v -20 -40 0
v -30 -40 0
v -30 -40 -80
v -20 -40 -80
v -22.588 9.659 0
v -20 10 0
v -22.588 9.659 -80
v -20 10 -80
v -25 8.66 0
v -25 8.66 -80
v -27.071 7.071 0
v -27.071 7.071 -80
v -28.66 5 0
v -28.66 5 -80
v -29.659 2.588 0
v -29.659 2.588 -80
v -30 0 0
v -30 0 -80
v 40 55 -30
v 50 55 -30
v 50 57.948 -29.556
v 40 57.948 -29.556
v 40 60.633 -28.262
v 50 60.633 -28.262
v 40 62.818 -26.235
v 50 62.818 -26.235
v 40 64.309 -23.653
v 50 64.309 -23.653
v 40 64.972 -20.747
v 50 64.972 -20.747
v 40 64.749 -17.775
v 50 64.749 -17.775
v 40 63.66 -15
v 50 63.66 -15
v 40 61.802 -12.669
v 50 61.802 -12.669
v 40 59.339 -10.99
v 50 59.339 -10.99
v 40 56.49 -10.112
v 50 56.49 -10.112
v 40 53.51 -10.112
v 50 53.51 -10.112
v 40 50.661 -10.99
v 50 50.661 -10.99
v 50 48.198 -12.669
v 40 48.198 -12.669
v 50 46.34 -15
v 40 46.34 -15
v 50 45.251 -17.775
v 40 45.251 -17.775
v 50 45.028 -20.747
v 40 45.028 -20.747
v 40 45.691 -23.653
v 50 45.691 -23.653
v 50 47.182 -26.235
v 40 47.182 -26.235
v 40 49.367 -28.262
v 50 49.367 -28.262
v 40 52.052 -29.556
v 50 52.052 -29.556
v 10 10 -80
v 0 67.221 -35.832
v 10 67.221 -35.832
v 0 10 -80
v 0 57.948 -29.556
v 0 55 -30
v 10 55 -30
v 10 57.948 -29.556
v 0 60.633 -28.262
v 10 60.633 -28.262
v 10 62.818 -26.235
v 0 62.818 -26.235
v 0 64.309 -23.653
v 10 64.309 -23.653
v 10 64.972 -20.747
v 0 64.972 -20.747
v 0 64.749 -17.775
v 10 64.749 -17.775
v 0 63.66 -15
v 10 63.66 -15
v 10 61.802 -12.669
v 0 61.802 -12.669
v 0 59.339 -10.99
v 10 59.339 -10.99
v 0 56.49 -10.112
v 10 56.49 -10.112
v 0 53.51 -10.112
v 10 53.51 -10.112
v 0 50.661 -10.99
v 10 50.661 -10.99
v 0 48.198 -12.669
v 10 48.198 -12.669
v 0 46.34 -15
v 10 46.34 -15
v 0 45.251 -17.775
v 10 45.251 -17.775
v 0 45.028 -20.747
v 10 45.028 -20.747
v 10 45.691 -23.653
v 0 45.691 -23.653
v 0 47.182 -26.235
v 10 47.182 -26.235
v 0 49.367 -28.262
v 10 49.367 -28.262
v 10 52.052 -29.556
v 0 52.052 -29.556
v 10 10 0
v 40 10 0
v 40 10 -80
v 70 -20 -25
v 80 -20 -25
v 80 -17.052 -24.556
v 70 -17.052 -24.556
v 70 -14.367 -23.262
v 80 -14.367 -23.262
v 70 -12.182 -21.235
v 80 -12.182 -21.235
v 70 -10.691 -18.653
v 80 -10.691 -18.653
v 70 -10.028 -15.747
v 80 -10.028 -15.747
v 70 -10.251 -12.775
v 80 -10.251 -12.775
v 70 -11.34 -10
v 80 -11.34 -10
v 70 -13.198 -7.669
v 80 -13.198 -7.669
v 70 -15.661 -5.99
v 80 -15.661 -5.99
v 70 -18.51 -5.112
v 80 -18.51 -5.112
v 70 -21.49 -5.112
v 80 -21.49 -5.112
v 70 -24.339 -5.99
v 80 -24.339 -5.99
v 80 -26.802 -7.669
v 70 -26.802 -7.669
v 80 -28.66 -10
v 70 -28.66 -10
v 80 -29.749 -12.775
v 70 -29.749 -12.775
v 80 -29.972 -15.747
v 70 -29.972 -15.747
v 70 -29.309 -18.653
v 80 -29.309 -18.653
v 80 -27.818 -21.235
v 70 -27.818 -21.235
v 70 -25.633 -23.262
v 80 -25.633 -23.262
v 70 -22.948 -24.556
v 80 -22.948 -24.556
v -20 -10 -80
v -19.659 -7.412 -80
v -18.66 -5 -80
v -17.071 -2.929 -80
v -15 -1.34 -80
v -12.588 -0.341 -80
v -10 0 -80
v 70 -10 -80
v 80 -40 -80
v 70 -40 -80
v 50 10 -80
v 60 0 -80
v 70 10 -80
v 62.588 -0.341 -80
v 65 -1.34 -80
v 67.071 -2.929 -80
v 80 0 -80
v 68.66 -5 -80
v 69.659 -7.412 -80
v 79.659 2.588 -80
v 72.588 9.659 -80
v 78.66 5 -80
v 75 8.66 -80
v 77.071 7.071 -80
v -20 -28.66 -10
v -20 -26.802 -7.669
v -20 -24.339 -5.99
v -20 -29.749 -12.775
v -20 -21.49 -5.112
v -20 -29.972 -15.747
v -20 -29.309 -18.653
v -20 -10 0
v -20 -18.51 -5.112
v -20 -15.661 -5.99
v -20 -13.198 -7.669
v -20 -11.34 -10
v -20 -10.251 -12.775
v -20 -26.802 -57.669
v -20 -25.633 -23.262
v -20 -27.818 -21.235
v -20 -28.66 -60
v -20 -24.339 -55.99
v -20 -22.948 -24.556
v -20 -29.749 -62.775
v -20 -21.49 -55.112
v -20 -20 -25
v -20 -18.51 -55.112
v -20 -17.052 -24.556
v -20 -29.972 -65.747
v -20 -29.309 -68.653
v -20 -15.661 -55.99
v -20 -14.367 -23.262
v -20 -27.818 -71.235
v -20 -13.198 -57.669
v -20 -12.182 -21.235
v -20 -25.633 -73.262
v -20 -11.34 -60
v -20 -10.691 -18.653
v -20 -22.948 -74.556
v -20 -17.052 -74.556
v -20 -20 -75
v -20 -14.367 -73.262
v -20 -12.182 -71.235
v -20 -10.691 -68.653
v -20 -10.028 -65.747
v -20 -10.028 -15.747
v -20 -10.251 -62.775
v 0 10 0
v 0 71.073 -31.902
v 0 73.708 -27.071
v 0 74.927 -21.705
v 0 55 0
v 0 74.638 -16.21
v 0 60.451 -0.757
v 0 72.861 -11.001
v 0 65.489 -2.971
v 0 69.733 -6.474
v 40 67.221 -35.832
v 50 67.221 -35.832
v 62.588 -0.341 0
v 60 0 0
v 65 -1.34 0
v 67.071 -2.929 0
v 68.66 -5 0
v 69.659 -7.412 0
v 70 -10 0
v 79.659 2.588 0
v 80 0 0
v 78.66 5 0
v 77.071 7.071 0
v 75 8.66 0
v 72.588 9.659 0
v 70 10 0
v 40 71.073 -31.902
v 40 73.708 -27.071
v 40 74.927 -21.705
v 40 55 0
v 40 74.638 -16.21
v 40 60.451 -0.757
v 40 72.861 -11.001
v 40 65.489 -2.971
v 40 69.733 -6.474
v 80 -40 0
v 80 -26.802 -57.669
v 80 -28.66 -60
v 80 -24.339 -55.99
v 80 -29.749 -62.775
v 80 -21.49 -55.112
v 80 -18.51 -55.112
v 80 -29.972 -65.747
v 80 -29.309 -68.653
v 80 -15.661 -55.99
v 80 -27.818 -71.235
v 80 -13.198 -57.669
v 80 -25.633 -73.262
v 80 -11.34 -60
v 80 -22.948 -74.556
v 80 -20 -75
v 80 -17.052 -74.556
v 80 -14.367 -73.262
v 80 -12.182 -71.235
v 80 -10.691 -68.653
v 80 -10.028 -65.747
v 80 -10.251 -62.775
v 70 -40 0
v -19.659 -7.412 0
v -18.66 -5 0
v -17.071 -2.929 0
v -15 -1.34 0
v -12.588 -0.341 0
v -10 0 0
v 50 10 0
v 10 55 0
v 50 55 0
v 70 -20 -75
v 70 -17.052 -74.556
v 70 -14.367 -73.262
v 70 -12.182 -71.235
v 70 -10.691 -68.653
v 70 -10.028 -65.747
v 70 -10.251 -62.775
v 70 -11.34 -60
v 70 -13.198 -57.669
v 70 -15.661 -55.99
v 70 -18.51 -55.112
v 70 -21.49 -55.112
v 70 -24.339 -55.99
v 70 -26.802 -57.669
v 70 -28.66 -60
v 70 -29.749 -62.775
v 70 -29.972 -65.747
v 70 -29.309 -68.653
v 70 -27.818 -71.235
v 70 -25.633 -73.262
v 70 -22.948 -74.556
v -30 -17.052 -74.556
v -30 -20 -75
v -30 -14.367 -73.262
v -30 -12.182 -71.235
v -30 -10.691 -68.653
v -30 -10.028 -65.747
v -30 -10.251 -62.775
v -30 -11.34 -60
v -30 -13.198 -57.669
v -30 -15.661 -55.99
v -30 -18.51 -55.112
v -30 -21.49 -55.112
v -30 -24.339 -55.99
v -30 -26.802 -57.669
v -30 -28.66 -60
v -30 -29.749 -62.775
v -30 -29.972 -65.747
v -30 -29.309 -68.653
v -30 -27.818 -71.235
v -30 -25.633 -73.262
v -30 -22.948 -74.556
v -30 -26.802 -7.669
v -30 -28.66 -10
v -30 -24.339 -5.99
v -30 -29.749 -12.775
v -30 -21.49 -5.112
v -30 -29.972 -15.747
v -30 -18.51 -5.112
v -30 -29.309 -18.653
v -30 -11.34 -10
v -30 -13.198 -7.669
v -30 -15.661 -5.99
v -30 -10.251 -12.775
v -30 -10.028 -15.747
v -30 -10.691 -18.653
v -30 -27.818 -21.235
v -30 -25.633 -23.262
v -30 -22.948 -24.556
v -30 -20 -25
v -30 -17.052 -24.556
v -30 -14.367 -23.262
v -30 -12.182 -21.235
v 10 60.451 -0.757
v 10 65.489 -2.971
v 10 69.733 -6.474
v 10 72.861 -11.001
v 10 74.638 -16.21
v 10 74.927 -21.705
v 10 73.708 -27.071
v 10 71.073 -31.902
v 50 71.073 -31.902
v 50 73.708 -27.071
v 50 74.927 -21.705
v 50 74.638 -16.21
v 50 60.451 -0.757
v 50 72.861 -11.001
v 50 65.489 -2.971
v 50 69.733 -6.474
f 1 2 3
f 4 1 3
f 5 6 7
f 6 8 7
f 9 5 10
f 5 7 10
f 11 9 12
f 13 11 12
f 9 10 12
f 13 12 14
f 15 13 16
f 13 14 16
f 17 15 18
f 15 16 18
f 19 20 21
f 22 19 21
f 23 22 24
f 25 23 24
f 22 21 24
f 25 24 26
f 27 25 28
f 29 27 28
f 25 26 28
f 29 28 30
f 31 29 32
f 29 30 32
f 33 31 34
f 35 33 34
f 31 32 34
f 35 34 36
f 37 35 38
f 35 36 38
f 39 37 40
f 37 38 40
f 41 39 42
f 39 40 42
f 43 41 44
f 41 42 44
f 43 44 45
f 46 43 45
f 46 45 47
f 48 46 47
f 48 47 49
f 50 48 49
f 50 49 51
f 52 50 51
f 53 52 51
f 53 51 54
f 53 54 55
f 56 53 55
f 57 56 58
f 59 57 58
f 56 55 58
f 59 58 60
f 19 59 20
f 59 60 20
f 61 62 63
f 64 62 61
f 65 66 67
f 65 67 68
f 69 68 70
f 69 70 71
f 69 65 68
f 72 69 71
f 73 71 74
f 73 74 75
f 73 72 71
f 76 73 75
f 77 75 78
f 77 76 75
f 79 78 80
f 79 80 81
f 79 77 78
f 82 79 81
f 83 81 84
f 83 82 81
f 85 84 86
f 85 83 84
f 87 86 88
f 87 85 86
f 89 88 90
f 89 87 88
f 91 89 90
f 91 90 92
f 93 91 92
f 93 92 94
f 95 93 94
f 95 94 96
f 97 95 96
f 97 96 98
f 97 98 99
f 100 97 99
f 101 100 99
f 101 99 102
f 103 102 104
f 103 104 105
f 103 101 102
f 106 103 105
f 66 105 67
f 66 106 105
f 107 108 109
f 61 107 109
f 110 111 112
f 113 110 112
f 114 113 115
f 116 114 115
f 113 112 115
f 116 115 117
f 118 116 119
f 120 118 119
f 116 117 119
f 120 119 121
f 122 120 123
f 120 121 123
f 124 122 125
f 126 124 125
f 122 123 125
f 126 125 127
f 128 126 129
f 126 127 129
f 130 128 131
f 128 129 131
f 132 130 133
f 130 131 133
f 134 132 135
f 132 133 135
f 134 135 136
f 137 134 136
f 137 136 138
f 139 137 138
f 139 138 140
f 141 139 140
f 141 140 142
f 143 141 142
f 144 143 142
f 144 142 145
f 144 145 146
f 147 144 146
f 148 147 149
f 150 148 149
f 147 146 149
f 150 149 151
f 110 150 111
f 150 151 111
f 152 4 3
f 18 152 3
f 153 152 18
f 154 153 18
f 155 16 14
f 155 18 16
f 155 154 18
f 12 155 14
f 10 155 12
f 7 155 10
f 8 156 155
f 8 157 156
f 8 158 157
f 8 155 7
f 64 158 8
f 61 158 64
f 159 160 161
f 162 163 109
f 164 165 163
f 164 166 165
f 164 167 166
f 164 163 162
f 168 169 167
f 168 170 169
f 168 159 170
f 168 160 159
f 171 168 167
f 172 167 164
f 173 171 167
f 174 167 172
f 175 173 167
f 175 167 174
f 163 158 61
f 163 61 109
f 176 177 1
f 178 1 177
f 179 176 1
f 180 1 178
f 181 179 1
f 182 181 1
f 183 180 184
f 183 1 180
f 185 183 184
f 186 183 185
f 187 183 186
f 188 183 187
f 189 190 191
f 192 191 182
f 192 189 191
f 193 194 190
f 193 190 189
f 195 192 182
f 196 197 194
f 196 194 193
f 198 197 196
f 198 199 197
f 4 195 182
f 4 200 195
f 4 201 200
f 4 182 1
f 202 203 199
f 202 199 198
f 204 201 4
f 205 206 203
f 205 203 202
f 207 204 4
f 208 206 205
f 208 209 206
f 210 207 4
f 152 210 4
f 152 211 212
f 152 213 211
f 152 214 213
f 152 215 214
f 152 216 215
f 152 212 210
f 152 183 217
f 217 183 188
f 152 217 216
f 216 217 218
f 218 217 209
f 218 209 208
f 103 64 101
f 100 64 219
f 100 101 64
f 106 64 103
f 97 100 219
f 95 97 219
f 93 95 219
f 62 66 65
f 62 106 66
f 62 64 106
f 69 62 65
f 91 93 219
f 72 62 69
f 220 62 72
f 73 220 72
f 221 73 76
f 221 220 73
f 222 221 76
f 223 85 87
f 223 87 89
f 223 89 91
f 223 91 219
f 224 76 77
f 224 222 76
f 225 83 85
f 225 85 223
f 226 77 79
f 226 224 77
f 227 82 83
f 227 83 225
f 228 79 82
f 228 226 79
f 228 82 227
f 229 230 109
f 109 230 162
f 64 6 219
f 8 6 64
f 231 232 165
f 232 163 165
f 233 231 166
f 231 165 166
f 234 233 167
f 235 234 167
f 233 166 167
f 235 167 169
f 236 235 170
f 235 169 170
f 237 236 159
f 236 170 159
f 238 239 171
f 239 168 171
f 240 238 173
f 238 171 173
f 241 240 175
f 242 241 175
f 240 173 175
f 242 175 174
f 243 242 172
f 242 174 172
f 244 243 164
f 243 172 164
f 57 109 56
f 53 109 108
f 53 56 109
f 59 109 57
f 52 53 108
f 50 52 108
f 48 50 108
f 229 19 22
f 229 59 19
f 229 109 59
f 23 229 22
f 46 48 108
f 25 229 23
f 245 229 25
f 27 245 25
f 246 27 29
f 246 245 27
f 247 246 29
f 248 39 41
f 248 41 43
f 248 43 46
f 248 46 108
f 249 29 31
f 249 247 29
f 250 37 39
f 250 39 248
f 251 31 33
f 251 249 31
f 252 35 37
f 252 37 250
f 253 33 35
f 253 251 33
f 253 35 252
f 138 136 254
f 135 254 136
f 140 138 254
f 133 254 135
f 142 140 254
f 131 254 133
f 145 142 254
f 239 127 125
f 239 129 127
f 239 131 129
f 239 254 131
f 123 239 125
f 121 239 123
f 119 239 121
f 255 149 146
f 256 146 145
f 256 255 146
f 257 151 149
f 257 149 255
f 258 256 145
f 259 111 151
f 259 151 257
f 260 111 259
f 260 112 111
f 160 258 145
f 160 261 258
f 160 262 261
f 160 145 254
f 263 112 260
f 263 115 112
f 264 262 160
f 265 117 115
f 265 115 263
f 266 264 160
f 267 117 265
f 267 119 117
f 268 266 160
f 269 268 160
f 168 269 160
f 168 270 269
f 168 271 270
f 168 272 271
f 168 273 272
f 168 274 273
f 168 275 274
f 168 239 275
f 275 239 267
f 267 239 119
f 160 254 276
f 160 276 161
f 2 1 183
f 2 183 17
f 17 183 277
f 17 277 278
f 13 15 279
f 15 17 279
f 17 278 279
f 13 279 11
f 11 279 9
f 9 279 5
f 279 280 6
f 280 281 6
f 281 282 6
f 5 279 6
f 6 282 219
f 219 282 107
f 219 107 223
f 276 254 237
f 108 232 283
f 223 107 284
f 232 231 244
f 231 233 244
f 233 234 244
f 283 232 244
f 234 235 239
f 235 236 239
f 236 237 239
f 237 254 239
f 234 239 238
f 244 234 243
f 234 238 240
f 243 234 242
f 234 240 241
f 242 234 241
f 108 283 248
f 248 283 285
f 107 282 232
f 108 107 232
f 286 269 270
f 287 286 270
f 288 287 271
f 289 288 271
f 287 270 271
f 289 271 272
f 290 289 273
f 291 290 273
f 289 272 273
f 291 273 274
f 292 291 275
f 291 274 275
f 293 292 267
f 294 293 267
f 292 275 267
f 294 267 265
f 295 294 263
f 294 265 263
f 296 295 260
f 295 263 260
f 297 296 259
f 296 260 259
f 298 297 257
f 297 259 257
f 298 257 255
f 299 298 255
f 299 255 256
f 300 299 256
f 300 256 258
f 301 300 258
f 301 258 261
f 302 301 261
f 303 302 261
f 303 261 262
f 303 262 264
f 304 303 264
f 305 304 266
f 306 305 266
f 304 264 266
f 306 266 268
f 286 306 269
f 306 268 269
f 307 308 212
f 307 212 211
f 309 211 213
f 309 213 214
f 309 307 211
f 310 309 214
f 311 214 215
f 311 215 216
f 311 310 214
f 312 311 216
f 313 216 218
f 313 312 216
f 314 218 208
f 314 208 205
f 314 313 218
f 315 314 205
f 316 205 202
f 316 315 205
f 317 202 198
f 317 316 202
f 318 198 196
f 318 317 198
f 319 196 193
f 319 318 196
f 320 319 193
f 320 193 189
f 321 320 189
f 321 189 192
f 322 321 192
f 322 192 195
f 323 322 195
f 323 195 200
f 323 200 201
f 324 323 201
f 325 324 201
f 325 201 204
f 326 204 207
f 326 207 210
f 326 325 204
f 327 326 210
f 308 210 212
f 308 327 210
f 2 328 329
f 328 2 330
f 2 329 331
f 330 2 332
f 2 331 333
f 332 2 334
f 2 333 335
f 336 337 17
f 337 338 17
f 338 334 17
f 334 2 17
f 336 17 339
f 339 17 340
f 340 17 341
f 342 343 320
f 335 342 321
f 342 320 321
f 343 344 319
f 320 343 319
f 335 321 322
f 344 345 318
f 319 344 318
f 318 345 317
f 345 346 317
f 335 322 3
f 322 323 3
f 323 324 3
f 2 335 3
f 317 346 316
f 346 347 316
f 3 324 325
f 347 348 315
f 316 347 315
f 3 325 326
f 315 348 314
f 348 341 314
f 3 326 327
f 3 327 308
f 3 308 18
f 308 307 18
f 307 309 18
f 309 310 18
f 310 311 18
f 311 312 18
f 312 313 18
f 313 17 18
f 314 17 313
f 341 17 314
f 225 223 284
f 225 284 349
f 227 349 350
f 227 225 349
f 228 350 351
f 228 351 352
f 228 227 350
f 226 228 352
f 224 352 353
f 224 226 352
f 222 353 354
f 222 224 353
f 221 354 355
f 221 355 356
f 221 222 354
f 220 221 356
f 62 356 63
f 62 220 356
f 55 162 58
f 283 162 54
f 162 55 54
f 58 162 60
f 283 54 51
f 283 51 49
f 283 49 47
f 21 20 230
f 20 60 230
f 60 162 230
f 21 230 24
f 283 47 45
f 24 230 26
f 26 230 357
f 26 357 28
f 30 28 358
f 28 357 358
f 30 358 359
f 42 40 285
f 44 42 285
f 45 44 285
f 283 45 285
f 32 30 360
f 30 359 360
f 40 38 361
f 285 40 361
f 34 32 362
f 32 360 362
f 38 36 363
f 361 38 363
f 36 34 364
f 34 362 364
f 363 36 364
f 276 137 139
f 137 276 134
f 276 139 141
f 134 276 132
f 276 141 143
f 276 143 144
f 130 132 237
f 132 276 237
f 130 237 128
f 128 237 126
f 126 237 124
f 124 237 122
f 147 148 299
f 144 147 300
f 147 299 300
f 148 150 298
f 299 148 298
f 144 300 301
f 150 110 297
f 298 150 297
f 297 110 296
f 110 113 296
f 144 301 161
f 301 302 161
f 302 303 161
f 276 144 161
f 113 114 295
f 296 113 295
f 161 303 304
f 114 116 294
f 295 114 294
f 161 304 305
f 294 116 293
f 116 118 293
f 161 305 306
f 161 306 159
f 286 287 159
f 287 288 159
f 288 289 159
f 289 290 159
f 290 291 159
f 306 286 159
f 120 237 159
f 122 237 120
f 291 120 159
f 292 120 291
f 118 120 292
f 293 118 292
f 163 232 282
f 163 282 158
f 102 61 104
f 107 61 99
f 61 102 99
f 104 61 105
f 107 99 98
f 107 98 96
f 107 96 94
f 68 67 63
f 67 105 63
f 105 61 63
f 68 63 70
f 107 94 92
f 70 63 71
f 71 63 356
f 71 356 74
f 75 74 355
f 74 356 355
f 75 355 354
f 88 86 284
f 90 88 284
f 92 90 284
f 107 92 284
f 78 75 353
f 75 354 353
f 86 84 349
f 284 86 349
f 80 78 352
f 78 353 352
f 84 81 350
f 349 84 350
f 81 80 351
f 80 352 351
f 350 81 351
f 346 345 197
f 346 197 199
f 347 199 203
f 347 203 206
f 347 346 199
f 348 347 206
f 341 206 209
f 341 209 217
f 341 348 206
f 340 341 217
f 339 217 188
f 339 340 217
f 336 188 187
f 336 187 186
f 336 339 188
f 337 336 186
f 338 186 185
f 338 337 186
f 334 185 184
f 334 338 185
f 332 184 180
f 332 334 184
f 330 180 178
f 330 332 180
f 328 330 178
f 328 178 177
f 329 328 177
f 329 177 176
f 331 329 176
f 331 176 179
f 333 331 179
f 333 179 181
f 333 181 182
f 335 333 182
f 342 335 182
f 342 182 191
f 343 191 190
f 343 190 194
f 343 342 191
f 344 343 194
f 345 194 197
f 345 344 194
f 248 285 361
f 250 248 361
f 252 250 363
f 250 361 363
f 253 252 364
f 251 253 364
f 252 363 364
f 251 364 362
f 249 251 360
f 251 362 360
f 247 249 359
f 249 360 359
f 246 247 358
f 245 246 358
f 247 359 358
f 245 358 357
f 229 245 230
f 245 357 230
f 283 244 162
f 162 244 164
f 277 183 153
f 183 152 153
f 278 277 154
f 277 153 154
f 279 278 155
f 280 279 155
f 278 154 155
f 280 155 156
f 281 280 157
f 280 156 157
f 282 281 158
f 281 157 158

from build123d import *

# Parameters (mm, degrees)
SKETCH1_R                = 10
BOSS_EXTRUDE1_DEPTH      = 10
BOSS_EXTRUDE2_DEPTH      = 25
BOSS_EXTRUDE2_DEPTH_BACK = 30
SKETCH1_4_W              = 80.000017133
SKETCH1_4_H              = 10.000013225
BOSS_EXTRUDE3_START      = -30
SKETCH1_5_W              = 80.000017133
SKETCH1_5_H              = 40
SKETCH1_5_R              = 10
BOSS_EXTRUDE3_DEPTH      = 10
FILLET1_R                = 10


with BuildPart() as part:
    # Sketch1 → Boss-Extrude1 (new body)
    with BuildSketch(Plane(origin=(0, 0, 0), x_dir=(0, 0, -1), z_dir=(1, 0, 0))):
        with BuildLine():
            Line((0, 55), (0, 10.000013225))
            Line((0, 10.000013225), (80.000017133, 10.000013225))
            Line((80.000017133, 10.000013225), (35.832128843, 67.220625855))
            ThreePointArc((35.832128843, 67.220625855), (13.54409483, 73.929376335), (0, 55))
        make_face()
        with Locations((20, 55)):
            Circle(SKETCH1_R, mode=Mode.SUBTRACT)
    extrude(amount=BOSS_EXTRUDE1_DEPTH)

    # Sketch1<4> → Boss-Extrude2 (add, two sides: drawn at the far end of the back side and taken through both)
    with BuildSketch(Plane(origin=(0, 0, 0), x_dir=(0, 0, -1), z_dir=(1, 0, 0)).offset(-BOSS_EXTRUDE2_DEPTH_BACK)):
        with Locations((40.000008567, 5.000006613)):
            Rectangle(SKETCH1_4_W, SKETCH1_4_H)
    extrude(amount=BOSS_EXTRUDE2_DEPTH + BOSS_EXTRUDE2_DEPTH_BACK)

    # Sketch1<5> → Boss-Extrude3 (add)
    with BuildSketch(Plane(origin=(0, 0, 0), x_dir=(0, 0, -1), z_dir=(1, 0, 0)).offset(BOSS_EXTRUDE3_START)):
        with Locations((40.000008567, -20)):
            Rectangle(SKETCH1_5_W, SKETCH1_5_H)
        with Locations((15, -20)):
            Circle(SKETCH1_5_R, mode=Mode.SUBTRACT)
        with Locations((65, -20)):
            Circle(SKETCH1_5_R, mode=Mode.SUBTRACT)
    extrude(amount=BOSS_EXTRUDE3_DEPTH)

    # Mirror3: part across plane


with BuildPart() as part_1:
    add(part.part)
    add(part.part.mirror(Plane(origin=(25, 0, 0), x_dir=(0, 0, 1), z_dir=(1, 0, 0))))

    # Fillet1
    fillet1_edges = [part_1.edges().sort_by_distance(p)[0] for p in [
        (70, 0, -40.000008566),
        (-20, 0, -40.000008566),
        (80, 10.000013225, -40.000008566),
        (-30, 10.000013225, -40.000008566),
    ]]
    fillet(fillet1_edges, radius=FILLET1_R)


solid = part_1.part
